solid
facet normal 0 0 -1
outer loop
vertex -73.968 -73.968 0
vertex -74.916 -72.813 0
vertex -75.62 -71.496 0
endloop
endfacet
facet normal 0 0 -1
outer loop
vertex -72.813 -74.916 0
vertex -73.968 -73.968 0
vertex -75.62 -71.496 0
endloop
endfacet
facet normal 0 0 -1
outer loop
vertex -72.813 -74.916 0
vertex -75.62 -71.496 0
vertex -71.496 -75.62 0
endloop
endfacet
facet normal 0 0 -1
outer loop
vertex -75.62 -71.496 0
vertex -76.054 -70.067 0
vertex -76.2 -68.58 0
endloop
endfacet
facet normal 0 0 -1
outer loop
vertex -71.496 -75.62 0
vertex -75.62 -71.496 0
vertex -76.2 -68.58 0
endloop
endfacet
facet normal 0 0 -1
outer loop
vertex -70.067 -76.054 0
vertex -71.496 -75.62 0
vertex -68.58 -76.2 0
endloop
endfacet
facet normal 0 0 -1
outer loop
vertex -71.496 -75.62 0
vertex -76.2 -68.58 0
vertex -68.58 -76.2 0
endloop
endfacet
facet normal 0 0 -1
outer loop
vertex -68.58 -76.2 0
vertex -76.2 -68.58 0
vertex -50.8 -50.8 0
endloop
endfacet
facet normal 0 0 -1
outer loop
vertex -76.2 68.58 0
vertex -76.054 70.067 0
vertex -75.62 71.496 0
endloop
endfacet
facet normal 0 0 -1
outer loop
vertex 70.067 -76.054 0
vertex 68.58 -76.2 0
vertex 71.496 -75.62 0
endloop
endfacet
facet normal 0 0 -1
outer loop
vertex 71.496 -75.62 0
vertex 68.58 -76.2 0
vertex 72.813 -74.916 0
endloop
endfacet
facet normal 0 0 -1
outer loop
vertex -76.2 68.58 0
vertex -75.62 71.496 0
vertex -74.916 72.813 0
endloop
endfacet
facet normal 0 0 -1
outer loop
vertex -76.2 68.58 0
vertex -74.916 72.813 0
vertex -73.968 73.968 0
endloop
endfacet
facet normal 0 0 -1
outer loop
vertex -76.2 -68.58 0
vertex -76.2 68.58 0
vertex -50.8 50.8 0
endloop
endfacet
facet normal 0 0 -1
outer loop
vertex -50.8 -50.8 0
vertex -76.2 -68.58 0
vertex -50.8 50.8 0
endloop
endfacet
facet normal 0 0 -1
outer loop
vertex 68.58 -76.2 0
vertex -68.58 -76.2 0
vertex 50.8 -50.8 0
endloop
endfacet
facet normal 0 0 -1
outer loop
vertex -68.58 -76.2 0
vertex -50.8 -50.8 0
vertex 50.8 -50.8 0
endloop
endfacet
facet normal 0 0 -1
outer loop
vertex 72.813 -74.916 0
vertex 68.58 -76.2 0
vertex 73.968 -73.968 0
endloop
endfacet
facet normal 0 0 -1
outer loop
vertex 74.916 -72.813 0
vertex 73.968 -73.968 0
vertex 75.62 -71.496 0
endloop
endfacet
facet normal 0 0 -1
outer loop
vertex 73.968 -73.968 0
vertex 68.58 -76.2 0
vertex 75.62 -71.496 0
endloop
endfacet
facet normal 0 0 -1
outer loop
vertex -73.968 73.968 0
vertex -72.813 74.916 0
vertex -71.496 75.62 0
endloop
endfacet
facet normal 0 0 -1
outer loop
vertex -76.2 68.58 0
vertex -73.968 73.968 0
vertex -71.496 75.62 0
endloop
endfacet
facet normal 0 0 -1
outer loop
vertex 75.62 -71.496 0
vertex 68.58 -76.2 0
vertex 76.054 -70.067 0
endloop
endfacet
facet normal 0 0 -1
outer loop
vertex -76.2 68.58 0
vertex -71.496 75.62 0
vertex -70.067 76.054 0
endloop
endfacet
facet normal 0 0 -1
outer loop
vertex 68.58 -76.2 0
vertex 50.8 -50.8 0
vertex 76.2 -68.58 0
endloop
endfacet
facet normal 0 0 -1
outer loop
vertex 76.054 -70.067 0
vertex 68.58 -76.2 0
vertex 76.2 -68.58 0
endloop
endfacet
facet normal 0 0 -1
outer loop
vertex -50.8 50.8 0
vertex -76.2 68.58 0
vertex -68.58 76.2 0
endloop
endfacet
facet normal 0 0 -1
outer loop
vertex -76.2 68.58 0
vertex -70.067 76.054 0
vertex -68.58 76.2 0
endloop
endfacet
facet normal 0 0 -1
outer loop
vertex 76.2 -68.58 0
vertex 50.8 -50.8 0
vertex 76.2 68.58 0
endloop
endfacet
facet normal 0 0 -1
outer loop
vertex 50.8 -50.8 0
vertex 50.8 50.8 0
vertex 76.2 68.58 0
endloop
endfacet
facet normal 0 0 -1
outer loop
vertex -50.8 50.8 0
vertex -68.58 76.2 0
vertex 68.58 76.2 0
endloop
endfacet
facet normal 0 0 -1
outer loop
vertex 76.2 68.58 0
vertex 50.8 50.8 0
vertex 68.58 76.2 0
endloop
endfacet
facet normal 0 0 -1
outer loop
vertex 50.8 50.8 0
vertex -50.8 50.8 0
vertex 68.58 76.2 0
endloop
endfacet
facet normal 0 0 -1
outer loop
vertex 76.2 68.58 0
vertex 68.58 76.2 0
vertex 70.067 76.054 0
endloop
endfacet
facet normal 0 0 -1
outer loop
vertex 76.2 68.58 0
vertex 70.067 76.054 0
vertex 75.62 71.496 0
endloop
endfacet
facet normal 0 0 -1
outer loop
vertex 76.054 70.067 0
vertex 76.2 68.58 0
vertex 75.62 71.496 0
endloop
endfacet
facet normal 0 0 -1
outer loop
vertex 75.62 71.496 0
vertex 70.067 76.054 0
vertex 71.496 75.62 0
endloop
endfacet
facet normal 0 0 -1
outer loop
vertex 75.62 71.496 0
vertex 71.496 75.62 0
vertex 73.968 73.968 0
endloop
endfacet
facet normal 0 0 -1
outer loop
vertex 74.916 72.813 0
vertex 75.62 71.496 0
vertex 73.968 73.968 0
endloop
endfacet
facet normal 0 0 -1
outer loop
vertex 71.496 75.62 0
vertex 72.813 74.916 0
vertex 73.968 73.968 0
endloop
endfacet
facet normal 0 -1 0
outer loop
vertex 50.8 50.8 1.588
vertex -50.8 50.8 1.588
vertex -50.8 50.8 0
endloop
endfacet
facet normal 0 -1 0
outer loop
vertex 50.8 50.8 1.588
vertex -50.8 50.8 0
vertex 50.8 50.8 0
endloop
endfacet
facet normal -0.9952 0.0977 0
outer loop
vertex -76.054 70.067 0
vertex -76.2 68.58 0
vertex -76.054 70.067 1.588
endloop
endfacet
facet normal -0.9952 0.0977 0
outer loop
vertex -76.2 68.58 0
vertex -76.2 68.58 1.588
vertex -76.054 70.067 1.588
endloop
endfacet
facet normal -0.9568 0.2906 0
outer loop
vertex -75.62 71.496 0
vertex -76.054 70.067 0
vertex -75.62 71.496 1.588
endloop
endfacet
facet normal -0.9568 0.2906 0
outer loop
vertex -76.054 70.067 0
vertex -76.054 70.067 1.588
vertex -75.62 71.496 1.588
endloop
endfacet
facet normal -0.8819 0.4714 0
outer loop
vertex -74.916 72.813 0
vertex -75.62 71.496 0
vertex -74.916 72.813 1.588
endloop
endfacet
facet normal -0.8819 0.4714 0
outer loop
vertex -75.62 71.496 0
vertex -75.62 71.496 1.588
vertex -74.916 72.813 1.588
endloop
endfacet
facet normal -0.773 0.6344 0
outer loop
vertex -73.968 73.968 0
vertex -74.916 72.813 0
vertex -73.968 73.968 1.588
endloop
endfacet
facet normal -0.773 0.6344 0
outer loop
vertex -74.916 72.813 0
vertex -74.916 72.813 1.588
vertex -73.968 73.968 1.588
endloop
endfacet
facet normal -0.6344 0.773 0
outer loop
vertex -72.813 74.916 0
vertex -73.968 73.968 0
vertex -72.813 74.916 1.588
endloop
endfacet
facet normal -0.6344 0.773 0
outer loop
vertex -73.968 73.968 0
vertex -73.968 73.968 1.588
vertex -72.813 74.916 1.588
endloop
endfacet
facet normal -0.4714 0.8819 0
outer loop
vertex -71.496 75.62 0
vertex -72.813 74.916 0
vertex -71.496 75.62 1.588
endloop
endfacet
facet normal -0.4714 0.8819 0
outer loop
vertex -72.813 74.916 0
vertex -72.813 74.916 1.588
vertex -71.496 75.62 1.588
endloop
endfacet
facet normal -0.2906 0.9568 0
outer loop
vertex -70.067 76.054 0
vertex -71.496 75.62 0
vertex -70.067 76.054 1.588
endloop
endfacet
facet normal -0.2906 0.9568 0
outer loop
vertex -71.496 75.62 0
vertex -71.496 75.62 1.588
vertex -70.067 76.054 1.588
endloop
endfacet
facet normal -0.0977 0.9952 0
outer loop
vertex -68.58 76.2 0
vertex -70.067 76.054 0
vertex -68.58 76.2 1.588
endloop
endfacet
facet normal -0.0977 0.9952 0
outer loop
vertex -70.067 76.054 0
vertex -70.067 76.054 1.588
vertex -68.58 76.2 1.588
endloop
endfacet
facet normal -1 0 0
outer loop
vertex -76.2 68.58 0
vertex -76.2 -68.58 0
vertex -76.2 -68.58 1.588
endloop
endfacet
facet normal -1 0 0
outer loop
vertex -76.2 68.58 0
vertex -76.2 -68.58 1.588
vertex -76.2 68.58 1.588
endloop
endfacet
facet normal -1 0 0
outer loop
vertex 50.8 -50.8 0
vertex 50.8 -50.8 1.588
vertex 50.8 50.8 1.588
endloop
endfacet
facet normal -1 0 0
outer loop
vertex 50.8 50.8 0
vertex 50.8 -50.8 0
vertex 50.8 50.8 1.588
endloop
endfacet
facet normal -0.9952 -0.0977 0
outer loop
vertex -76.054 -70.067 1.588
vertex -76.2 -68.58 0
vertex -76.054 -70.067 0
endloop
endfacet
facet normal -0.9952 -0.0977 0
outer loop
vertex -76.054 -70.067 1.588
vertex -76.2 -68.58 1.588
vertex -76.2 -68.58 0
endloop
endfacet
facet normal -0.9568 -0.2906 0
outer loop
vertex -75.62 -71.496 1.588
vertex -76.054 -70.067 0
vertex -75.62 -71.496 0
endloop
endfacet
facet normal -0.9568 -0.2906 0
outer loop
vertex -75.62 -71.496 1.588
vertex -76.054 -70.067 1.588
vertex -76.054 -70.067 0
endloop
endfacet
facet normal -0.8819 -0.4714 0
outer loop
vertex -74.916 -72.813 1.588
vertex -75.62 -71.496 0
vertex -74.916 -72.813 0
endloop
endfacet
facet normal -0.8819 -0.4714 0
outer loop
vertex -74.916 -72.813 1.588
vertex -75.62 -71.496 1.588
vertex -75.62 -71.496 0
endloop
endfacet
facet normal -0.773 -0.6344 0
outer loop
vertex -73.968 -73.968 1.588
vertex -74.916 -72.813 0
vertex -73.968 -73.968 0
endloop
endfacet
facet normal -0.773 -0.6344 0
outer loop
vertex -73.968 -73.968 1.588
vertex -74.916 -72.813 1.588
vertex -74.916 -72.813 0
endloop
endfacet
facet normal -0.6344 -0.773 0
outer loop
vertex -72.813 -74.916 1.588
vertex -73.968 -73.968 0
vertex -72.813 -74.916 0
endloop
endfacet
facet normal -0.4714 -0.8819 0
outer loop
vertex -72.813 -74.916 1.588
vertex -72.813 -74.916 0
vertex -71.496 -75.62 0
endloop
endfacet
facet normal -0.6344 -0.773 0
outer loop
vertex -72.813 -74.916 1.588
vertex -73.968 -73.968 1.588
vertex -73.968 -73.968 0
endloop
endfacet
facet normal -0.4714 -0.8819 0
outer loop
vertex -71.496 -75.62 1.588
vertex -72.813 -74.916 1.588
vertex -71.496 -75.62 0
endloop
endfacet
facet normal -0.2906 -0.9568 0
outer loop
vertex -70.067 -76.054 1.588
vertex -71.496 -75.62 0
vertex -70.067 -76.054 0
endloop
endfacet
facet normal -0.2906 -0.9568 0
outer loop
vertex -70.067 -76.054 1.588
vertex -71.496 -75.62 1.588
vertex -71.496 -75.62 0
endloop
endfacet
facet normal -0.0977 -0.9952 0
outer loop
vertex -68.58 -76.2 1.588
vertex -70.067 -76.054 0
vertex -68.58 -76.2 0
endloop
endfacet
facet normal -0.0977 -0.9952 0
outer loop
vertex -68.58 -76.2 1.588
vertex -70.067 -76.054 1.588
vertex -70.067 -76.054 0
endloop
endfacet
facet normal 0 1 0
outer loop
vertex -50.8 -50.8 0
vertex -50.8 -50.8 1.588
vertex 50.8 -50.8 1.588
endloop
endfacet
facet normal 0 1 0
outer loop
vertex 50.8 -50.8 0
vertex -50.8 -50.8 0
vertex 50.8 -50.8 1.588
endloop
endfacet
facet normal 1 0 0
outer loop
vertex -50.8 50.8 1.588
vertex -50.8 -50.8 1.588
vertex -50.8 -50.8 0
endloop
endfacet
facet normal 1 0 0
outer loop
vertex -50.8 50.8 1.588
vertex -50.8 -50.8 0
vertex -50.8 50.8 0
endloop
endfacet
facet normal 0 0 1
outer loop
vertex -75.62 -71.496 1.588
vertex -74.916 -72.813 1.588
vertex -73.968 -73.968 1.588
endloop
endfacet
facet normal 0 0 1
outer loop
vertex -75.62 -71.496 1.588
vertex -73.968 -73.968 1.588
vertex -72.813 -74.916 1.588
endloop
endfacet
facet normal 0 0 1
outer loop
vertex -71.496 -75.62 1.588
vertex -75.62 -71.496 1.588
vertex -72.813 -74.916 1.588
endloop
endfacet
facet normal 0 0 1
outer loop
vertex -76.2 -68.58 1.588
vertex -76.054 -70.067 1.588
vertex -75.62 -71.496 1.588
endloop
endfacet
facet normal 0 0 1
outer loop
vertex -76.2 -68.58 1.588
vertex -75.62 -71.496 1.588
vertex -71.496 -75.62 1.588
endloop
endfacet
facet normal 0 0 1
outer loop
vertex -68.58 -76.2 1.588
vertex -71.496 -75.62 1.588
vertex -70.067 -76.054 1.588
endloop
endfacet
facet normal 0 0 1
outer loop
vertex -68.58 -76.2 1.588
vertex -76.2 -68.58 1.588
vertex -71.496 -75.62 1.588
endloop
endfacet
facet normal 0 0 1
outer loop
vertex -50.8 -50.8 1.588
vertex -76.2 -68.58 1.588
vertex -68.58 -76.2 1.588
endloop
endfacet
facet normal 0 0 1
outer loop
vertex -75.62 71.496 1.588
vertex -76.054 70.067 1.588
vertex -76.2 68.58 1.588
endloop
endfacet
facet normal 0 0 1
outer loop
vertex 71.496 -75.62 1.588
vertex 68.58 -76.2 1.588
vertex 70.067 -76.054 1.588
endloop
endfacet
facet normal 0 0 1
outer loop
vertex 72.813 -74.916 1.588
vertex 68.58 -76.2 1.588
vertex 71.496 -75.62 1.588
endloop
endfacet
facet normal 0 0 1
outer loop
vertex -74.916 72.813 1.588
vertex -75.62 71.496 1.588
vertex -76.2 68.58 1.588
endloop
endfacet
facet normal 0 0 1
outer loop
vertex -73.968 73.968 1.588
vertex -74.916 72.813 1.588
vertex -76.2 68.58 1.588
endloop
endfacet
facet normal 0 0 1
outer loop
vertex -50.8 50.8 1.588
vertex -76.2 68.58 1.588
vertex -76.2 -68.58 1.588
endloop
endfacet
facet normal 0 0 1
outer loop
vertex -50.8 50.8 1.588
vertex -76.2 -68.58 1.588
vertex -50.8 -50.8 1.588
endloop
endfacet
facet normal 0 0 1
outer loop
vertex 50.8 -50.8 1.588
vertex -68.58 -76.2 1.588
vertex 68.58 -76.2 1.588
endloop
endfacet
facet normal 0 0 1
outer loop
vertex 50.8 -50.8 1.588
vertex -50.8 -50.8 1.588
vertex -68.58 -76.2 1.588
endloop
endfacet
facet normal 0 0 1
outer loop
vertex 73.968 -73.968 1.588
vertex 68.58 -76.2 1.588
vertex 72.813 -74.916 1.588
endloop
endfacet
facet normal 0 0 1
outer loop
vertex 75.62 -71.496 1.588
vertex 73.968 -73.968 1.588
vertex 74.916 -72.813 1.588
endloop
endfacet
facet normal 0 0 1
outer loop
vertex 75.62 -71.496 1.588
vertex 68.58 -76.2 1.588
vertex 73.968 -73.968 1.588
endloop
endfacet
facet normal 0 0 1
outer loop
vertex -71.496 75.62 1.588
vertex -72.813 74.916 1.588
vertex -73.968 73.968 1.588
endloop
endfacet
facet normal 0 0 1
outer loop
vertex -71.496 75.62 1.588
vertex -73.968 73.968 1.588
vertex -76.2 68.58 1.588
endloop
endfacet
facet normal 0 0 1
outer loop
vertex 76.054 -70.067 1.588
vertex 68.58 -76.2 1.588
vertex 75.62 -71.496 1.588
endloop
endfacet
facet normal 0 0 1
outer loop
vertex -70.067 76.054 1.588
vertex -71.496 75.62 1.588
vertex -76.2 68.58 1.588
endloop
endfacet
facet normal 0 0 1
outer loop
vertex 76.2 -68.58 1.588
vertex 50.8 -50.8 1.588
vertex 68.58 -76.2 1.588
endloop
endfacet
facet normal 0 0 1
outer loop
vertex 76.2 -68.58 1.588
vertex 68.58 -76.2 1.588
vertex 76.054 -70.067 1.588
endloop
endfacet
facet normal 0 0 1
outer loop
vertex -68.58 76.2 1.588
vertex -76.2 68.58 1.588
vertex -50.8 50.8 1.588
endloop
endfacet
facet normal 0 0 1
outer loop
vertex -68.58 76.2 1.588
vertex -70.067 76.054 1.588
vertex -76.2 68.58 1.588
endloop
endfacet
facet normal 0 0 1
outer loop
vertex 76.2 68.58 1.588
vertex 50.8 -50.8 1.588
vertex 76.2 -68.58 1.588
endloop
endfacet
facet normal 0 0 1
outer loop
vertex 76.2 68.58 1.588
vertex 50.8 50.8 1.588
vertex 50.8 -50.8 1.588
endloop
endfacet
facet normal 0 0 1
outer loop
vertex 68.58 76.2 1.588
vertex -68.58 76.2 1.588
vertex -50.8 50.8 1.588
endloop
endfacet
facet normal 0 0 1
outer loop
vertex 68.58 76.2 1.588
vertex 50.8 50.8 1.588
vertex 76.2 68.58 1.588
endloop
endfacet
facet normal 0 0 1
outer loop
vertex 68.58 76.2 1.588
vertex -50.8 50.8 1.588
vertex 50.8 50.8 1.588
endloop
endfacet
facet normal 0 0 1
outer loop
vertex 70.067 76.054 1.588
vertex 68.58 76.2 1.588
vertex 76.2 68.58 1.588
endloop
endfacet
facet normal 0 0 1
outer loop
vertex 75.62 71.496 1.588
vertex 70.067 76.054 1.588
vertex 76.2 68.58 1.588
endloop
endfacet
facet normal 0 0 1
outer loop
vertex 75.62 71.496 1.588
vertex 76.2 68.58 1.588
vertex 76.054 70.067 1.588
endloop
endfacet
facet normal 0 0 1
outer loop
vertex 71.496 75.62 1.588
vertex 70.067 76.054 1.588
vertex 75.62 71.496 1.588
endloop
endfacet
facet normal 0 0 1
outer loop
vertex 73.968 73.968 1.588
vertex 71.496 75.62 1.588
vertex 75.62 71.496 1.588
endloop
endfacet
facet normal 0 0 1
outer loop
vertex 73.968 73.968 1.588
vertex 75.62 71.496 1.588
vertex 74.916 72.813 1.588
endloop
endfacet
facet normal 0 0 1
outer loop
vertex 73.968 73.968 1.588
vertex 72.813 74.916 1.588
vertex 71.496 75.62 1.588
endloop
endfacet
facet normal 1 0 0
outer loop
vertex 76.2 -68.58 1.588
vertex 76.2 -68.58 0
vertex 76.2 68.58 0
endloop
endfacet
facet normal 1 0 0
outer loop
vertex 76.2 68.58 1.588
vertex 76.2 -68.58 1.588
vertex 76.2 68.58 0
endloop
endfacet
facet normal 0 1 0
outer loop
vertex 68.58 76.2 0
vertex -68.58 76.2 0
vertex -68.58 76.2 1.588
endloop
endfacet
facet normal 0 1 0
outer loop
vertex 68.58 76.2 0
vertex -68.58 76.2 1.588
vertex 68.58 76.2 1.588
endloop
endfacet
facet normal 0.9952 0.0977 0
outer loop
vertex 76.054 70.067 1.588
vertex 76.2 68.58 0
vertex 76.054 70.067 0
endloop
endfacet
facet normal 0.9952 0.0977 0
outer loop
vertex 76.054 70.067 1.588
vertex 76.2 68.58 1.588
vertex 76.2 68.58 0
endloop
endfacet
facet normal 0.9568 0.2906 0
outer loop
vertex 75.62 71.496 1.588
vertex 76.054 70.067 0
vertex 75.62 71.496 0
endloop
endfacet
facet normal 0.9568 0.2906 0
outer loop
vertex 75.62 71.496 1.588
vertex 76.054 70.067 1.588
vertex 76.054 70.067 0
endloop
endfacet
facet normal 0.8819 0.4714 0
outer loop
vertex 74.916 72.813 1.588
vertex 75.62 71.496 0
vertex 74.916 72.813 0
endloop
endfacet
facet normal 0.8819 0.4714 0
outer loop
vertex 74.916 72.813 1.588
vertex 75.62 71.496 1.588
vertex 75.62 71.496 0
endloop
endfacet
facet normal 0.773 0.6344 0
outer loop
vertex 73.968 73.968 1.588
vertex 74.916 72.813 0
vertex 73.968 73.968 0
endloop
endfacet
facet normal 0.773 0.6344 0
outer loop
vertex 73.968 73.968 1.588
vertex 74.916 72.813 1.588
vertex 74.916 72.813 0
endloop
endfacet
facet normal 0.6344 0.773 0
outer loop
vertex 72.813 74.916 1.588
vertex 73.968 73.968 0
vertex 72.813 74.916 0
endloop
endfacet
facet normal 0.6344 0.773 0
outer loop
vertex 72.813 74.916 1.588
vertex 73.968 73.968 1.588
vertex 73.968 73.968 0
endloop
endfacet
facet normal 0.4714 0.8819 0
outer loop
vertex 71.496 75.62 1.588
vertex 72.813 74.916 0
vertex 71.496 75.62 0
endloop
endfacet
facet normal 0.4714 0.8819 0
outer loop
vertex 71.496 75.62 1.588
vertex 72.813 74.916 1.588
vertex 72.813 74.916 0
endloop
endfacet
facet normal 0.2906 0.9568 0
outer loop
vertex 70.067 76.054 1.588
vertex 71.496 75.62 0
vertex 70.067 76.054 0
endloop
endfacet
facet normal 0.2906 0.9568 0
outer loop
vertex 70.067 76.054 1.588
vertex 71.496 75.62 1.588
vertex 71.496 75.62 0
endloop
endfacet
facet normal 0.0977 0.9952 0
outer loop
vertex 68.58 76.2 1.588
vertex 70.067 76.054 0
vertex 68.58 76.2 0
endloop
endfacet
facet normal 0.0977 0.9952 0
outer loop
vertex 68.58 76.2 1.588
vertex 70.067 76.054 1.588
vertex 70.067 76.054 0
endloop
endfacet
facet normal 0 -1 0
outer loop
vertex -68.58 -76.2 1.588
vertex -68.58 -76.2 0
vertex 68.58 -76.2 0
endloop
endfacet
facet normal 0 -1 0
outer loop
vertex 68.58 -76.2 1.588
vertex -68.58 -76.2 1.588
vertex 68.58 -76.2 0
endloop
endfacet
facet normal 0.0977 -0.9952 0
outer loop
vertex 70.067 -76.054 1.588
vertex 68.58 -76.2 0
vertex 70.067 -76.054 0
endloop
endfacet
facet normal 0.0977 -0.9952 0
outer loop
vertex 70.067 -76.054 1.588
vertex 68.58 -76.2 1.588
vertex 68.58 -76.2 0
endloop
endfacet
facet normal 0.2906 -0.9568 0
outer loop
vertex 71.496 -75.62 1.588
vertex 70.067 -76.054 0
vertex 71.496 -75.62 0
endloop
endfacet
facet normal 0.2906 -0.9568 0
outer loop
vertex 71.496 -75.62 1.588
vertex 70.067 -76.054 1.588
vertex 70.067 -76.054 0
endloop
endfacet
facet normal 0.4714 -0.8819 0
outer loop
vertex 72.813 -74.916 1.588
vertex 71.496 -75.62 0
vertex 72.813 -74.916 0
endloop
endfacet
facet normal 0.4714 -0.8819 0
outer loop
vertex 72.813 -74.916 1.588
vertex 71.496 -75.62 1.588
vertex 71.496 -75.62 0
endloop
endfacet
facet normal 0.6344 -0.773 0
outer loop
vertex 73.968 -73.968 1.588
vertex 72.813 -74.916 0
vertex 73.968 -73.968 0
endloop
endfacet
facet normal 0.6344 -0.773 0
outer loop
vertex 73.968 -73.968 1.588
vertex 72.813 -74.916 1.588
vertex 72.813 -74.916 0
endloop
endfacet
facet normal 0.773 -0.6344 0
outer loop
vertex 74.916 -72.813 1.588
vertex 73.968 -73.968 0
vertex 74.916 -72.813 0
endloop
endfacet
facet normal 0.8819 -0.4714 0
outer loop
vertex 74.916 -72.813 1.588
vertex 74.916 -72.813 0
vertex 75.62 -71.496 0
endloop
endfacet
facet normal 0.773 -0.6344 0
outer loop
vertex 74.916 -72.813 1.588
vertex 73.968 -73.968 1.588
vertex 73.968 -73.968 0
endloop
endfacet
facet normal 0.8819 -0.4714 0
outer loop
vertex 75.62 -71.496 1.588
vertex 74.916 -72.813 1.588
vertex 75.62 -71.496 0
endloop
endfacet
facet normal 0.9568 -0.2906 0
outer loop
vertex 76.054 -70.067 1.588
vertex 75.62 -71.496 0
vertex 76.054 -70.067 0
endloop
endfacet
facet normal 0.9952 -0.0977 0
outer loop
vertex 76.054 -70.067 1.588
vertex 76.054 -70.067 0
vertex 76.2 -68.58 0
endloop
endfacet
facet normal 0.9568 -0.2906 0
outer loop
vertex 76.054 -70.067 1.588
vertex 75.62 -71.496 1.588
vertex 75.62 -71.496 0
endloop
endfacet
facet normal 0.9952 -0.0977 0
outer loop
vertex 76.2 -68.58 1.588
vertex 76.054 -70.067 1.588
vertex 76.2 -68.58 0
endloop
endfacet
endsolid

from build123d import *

# Parameters (mm, degrees)
F0_W     = 152.4
F0_H     = 152.4
F1_DEPTH = 1.5875
F2_R     = 7.62
F3_W     = 101.6
F3_H     = 101.6
F4_DEPTH = 1.5885


with BuildPart() as f1:
    # F0 (on Top) → F1 (new body)
    with BuildSketch(Plane.XY):
        Rectangle(F0_W, F0_H)
    extrude(amount=F1_DEPTH)

    # F2
    f2_edges = [f1.edges().sort_by_distance(p)[0] for p in [
        (76.2, 76.2, 0.79375),
        (-76.2, -76.2, 0.79375),
        (76.2, -76.2, 0.79375),
        (-76.2, 76.2, 0.79375),
    ]]
    fillet(f2_edges, radius=F2_R)

    # F3 (on face) → F4 (cut, through all)
    with BuildSketch(Plane.XY.offset(1.5875)):
        Rectangle(F3_W, F3_H)
    extrude(amount=-F4_DEPTH, mode=Mode.SUBTRACT)


solid = f1.part
